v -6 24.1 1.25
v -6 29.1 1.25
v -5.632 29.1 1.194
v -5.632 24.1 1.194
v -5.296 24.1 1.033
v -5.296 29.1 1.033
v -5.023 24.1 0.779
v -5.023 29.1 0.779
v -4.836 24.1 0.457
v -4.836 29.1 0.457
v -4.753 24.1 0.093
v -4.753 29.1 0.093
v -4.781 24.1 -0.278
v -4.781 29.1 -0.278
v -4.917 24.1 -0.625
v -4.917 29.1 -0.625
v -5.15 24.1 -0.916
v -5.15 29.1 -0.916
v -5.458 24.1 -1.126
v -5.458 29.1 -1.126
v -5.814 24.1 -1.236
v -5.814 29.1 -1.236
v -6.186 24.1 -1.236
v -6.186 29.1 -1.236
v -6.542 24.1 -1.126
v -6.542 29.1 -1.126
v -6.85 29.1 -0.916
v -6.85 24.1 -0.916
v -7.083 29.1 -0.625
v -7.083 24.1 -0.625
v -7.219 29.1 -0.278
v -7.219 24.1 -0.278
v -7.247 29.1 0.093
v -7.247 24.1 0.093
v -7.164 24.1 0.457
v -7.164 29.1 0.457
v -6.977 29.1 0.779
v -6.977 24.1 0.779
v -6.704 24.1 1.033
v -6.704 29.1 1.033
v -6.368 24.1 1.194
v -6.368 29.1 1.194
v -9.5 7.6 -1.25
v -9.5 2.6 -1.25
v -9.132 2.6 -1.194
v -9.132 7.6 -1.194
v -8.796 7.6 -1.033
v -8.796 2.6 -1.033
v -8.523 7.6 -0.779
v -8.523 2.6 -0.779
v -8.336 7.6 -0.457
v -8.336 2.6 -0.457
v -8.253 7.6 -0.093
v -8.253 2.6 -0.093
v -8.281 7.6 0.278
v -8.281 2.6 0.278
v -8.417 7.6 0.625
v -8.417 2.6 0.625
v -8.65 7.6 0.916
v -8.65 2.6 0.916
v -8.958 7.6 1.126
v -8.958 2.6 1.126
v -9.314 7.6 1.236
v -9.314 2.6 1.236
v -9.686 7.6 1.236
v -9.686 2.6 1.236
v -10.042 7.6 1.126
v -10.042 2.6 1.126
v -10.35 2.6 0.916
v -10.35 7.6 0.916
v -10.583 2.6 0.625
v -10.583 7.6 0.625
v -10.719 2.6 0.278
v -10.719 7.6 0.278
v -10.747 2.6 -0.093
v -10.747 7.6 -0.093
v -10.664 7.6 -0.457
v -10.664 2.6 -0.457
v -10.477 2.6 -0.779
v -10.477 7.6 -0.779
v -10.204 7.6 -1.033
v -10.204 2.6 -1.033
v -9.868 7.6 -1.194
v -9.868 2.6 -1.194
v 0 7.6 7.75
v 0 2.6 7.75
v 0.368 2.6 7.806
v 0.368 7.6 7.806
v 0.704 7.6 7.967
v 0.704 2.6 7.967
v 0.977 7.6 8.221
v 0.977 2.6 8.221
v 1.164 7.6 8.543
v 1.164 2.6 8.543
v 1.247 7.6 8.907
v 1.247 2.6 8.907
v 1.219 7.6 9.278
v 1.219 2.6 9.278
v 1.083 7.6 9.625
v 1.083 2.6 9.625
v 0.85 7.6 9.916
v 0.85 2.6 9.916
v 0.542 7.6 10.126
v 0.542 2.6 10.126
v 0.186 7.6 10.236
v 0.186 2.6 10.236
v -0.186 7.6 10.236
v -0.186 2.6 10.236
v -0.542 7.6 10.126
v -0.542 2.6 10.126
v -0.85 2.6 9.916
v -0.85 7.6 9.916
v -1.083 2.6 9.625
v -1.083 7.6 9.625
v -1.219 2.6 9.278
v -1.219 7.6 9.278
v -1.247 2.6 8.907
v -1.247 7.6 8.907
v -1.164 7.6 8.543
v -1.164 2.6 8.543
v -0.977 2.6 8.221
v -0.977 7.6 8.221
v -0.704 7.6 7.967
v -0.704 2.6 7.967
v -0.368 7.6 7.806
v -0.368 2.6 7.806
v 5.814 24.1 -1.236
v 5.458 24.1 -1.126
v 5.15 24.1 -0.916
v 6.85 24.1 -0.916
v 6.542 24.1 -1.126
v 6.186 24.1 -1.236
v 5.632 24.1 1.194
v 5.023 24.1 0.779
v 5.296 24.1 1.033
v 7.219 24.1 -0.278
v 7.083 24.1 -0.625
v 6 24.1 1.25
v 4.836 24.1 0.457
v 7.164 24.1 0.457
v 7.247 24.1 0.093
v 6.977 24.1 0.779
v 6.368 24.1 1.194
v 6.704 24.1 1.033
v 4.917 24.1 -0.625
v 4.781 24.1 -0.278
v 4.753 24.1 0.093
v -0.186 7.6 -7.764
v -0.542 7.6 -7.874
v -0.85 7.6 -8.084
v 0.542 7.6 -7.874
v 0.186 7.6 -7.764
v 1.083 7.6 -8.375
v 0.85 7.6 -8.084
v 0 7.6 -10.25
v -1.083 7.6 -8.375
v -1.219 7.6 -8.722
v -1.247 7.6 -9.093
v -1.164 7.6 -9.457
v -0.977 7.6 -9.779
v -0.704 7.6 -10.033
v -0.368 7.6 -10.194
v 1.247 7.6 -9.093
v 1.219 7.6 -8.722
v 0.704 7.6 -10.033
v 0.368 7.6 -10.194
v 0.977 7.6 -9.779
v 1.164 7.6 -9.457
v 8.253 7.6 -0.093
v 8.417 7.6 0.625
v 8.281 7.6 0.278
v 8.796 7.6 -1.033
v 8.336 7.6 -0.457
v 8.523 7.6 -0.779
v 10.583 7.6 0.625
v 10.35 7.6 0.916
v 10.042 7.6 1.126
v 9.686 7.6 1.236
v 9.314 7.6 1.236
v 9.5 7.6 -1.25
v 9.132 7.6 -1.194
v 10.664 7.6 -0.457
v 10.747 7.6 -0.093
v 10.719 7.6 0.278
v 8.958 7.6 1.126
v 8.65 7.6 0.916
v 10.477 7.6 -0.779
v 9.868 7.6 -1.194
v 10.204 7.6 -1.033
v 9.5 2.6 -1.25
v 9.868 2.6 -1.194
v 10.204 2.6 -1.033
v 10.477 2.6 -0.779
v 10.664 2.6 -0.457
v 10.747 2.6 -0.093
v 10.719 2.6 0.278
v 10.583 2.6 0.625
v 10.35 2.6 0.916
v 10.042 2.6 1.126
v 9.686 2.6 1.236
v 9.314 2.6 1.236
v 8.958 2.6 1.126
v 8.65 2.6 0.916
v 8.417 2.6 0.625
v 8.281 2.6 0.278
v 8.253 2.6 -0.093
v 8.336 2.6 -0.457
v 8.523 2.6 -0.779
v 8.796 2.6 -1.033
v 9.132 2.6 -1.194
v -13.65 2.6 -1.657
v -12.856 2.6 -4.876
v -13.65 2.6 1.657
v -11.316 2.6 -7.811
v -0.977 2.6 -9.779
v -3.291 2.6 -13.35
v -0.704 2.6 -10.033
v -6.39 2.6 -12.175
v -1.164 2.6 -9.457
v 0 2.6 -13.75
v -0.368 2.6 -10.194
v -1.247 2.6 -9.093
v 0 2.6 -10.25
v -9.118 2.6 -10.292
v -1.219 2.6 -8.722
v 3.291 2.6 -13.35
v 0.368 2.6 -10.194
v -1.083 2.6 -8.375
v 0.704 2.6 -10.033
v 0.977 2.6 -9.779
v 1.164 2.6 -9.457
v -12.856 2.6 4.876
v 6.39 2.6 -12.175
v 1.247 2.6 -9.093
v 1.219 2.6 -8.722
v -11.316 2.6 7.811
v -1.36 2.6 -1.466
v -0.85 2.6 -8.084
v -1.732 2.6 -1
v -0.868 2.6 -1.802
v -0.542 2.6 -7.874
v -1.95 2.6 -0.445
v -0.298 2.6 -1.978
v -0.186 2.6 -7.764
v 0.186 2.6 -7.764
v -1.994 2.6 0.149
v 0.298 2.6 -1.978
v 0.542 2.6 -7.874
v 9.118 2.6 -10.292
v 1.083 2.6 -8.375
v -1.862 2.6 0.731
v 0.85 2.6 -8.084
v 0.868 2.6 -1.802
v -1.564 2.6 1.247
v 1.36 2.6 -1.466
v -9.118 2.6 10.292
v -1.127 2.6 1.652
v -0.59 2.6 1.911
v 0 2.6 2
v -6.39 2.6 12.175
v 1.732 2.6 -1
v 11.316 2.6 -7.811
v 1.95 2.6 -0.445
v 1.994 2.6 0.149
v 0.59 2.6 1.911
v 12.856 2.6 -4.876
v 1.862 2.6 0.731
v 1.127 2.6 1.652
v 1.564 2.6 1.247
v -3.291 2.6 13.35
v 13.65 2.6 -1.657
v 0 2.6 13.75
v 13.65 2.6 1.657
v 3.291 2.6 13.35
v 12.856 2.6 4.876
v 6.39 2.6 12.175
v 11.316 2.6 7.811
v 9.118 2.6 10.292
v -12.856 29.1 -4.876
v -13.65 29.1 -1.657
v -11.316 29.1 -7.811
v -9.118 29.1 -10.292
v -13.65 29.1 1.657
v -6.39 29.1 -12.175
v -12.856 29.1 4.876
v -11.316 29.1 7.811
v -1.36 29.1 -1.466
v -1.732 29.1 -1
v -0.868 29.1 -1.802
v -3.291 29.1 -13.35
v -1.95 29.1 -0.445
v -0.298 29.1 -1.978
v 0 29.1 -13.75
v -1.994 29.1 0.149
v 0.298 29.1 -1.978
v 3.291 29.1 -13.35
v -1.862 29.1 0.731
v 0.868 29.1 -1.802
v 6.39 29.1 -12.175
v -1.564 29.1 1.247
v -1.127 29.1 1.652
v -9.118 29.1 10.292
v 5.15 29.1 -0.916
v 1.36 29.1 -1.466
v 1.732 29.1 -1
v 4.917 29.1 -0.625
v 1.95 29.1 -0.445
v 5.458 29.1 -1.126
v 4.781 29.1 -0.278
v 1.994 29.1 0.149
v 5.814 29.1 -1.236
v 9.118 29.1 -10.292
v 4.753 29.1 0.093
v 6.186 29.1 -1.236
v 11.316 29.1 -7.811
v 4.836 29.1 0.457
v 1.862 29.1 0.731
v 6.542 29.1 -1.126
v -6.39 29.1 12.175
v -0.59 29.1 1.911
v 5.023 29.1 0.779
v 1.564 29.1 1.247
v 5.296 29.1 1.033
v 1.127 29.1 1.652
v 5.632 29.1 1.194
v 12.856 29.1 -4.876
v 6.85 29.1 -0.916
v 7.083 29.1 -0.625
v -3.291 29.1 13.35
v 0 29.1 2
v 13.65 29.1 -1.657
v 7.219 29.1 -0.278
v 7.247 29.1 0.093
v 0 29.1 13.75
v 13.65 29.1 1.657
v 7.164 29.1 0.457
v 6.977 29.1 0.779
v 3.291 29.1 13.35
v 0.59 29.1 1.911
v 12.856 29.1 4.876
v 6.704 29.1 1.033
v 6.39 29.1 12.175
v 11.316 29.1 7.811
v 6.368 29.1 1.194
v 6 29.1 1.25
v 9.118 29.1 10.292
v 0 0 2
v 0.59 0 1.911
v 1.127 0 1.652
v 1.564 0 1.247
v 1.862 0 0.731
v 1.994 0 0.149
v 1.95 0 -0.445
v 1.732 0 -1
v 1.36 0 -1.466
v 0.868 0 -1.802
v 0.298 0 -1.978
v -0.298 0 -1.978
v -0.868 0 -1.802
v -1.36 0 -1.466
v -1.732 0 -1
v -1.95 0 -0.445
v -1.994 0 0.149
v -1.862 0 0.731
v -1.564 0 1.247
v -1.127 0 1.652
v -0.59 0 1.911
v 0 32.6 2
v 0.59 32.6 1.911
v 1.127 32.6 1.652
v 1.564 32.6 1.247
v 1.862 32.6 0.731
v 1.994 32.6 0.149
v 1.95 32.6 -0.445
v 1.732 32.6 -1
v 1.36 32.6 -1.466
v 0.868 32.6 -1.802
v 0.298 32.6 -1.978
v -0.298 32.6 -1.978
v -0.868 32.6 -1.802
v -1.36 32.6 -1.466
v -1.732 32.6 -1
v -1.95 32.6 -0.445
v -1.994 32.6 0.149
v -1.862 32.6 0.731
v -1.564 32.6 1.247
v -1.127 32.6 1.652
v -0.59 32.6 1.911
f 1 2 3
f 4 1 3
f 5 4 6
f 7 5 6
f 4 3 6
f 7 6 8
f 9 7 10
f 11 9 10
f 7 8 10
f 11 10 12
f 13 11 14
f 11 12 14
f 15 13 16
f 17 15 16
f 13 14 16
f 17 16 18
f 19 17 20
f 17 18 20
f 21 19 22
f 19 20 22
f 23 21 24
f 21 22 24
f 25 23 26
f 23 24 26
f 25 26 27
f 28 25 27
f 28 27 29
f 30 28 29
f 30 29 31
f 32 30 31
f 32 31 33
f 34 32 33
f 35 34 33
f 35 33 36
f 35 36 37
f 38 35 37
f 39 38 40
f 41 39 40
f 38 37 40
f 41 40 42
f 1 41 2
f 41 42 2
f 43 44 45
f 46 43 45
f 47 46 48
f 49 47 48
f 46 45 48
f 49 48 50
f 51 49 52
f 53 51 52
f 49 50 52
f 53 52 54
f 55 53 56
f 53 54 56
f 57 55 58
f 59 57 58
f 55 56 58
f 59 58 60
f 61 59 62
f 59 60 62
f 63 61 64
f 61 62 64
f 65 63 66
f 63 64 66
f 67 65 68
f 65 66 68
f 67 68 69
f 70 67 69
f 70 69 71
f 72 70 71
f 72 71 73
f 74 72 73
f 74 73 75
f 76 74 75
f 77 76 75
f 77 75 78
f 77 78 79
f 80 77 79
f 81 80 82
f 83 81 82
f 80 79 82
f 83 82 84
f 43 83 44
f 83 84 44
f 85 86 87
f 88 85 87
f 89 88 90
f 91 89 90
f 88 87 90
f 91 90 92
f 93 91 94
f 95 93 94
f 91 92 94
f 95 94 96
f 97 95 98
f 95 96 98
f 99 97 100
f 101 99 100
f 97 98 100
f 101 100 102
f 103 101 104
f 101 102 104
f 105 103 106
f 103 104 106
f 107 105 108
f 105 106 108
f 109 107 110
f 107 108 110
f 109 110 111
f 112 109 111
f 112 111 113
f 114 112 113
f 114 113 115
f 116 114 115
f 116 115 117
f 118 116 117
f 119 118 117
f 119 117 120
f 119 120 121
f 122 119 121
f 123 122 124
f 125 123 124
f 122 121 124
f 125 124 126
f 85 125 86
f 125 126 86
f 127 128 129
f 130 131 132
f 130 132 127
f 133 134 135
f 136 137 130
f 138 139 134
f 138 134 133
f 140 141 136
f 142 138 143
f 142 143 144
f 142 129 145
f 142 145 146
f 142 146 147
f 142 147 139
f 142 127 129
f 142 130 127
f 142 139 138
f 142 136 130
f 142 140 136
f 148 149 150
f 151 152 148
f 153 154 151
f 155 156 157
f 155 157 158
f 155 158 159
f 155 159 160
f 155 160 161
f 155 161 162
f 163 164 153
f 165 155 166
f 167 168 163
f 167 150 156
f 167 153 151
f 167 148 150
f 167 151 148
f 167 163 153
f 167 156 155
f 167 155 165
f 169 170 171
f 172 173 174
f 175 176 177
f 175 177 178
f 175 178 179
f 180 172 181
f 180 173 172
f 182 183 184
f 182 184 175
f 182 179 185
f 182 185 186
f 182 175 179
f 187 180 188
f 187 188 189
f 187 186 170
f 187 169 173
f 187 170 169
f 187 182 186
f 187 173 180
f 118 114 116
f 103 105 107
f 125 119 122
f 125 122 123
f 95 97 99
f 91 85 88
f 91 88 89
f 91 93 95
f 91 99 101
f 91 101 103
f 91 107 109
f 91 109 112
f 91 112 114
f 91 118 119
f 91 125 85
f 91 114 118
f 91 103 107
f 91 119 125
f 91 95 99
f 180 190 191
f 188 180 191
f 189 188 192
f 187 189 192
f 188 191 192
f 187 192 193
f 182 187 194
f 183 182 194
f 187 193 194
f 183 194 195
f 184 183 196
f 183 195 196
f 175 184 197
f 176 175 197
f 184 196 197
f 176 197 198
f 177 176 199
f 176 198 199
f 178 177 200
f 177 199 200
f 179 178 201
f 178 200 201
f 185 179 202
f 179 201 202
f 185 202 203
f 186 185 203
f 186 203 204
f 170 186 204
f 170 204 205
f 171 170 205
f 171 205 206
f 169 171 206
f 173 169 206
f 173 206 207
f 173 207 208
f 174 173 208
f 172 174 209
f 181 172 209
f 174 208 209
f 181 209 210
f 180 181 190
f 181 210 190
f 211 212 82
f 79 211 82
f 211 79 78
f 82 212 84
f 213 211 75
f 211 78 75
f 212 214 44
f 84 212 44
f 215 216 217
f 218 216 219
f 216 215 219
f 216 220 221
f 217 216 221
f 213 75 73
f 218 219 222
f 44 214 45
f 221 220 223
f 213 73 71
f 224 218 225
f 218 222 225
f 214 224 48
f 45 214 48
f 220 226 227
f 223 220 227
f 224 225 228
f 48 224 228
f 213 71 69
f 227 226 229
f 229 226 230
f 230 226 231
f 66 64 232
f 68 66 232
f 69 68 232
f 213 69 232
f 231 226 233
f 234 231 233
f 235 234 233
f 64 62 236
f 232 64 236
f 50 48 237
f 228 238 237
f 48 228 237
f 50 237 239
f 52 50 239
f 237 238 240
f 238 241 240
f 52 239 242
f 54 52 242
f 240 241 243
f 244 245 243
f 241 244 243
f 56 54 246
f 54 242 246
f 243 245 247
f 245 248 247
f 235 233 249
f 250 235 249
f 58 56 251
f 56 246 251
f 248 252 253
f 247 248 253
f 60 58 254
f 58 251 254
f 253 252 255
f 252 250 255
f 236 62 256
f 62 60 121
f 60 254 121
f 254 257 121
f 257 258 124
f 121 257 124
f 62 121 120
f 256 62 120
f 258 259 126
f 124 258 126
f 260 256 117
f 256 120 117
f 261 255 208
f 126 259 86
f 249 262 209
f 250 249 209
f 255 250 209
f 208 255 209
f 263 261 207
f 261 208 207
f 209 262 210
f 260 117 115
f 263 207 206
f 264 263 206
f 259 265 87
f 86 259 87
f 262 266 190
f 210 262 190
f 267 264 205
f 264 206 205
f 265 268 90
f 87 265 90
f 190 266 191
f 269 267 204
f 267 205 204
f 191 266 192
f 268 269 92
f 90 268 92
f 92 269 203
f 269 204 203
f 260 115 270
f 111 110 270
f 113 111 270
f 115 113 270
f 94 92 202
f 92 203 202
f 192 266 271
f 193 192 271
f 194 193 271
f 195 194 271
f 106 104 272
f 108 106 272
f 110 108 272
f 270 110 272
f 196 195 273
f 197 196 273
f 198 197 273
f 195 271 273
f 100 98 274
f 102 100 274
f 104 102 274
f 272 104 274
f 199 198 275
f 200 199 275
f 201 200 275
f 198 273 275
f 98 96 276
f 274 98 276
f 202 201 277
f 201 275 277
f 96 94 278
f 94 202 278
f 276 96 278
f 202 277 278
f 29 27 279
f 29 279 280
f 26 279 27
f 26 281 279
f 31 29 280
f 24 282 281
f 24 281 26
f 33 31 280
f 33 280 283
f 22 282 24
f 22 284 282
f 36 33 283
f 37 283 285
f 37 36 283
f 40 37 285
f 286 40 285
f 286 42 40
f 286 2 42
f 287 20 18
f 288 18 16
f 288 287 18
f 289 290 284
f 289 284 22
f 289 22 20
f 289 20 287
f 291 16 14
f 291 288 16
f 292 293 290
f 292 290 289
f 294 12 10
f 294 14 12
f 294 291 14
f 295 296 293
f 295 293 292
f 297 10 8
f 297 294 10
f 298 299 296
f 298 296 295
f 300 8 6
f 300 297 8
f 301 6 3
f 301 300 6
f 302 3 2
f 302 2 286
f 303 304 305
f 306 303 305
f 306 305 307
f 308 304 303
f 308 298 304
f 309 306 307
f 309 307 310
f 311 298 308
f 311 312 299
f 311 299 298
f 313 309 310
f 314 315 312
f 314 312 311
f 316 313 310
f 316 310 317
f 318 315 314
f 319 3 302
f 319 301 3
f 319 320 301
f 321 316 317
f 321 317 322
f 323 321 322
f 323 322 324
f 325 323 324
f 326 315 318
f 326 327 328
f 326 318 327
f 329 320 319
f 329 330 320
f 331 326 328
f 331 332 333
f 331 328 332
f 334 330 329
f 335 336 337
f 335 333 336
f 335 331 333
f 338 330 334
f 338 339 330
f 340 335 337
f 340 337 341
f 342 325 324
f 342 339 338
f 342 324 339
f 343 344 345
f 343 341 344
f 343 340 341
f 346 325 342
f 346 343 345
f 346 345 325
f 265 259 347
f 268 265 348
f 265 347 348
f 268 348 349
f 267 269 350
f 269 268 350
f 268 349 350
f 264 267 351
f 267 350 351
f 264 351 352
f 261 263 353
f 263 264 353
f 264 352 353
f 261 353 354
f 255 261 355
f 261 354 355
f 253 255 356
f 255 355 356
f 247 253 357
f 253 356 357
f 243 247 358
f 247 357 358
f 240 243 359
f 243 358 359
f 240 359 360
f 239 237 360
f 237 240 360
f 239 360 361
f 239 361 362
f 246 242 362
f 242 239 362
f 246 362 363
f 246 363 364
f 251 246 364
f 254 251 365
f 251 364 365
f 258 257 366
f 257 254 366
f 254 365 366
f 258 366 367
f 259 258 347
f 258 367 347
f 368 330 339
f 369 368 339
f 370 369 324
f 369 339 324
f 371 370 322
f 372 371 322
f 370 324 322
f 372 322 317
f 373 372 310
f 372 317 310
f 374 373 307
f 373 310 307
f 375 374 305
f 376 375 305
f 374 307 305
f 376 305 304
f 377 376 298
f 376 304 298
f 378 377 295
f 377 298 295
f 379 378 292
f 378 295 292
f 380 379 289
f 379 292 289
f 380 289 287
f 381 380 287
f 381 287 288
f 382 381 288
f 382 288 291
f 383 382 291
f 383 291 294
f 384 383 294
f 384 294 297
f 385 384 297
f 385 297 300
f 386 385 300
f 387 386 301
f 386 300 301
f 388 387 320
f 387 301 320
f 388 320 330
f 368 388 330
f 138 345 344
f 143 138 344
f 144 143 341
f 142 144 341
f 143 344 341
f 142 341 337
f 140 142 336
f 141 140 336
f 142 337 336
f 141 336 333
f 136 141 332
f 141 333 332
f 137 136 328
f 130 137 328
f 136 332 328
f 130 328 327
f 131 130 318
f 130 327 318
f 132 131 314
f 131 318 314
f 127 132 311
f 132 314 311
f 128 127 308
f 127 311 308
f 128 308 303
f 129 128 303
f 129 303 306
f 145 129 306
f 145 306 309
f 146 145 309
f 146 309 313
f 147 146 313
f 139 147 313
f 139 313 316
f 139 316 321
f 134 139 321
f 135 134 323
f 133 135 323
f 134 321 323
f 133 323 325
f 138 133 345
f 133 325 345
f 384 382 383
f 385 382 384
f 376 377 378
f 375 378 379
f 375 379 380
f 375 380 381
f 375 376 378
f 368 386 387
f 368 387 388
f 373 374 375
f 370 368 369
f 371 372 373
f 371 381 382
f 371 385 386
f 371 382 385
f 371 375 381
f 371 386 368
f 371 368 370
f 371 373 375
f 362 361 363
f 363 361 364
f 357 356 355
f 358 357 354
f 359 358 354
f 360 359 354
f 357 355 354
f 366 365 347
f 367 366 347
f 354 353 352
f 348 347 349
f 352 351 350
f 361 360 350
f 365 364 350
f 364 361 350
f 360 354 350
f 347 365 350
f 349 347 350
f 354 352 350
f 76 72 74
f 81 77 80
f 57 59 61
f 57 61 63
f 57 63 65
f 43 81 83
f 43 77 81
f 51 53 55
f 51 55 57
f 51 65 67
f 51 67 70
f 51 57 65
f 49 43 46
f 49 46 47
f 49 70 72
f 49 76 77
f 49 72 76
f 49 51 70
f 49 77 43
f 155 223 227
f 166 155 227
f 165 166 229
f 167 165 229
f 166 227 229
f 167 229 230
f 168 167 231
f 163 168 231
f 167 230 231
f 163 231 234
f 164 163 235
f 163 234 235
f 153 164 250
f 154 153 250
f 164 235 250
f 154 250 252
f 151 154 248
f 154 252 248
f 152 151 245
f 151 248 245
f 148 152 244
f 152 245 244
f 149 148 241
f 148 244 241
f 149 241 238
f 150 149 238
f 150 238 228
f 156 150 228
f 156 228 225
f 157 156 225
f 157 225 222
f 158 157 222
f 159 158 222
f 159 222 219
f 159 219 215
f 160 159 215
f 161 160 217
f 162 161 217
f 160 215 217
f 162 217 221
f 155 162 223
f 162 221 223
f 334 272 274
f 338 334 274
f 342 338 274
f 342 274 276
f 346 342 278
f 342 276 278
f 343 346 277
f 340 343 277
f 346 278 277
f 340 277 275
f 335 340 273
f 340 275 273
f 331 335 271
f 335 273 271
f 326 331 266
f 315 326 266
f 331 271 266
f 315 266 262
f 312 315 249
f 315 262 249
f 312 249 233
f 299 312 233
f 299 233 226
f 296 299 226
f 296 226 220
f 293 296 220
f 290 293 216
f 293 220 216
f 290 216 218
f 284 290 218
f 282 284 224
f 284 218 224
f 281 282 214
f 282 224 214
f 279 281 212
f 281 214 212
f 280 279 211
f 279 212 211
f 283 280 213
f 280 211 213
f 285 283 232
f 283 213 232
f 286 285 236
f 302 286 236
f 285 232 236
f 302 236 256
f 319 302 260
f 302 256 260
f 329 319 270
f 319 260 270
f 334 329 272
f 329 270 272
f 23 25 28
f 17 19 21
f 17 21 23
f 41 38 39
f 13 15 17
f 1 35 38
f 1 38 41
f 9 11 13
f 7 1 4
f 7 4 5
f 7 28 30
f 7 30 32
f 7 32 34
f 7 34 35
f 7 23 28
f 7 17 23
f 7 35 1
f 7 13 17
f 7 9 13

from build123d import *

# Parameters (mm, degrees)
SKETCH2_R           = 13.75
BOSS_EXTRUDE1_DEPTH = 26.5
SKETCH3_R           = 2
BOSS_EXTRUDE2_DEPTH = 3.5
SKETCH4_R           = 1.25
CUT_EXTRUDE1_DEPTH  = 5
BOSS_EXTRUDE3_REACH = 39.959
SKETCH1_R           = 2
SKETCH5_R           = 1.25
CUT_EXTRUDE2_DEPTH  = 5


with BuildPart() as part:
    # Sketch2 → Boss-Extrude1 (new body)
    with BuildSketch(Plane(origin=(0, 2.6, 0), x_dir=(1, 0, 0), z_dir=(0, 1, 0))):
        with Locations(Location((0, 0, 0), (0, 0, 270))):
            Circle(SKETCH2_R)
    extrude(amount=BOSS_EXTRUDE1_DEPTH)

    # Sketch3 → Boss-Extrude2 (add)
    with BuildSketch(Plane(origin=(0, 29.1, 0), x_dir=(1, 0, 0), z_dir=(0, 1, 0))):
        with Locations(Location((0, 0, 0), (0, 0, 270))):
            Circle(SKETCH3_R)
    extrude(amount=BOSS_EXTRUDE2_DEPTH)

    # Sketch4 → Cut-Extrude1 (cut)
    with BuildSketch(Plane(origin=(0, 29.1, 0), x_dir=(1, 0, 0), z_dir=(0, 1, 0))):
        with Locations(Location((-6, 0, 0), (0, 0, 270))):
            Circle(SKETCH4_R)
        with Locations(Location((6, 0, 0), (0, 0, 270))):
            Circle(SKETCH4_R)
    extrude(amount=-CUT_EXTRUDE1_DEPTH, mode=Mode.SUBTRACT)

    # Sketch1 → Boss-Extrude3 (add, up to next)
    with BuildSketch(Plane(origin=(0, 0, 0), x_dir=(1, 0, 0), z_dir=(0, 1, 0)), mode=Mode.PRIVATE) as boss_extrude3_sk1:
        with Locations(Location((0, 0, 0), (0, 0, 270))):
            Circle(SKETCH1_R)
    boss_extrude3_tool1 = extrude(boss_extrude3_sk1.sketch, amount=BOSS_EXTRUDE3_REACH, mode=Mode.PRIVATE) - part.part
    add(boss_extrude3_tool1.solids().sort_by_distance((0, 0, 0))[0])

    # Sketch5 → Cut-Extrude2 (cut)
    with BuildSketch(Plane.XZ.offset(-2.6)):
        with Locations(Location((0, 9.000000034, 0), (0, 0, 270))):
            Circle(SKETCH5_R)
        with Locations(Location((0, -9.000000034, 0), (0, 0, 270))):
            Circle(SKETCH5_R)
        with Locations(Location((-9.5000001, 0, 0), (0, 0, 270))):
            Circle(SKETCH5_R)
        with Locations(Location((9.5, 0, 0), (0, 0, 270))):
            Circle(SKETCH5_R)
    extrude(amount=-CUT_EXTRUDE2_DEPTH, mode=Mode.SUBTRACT)


solid = part.part
